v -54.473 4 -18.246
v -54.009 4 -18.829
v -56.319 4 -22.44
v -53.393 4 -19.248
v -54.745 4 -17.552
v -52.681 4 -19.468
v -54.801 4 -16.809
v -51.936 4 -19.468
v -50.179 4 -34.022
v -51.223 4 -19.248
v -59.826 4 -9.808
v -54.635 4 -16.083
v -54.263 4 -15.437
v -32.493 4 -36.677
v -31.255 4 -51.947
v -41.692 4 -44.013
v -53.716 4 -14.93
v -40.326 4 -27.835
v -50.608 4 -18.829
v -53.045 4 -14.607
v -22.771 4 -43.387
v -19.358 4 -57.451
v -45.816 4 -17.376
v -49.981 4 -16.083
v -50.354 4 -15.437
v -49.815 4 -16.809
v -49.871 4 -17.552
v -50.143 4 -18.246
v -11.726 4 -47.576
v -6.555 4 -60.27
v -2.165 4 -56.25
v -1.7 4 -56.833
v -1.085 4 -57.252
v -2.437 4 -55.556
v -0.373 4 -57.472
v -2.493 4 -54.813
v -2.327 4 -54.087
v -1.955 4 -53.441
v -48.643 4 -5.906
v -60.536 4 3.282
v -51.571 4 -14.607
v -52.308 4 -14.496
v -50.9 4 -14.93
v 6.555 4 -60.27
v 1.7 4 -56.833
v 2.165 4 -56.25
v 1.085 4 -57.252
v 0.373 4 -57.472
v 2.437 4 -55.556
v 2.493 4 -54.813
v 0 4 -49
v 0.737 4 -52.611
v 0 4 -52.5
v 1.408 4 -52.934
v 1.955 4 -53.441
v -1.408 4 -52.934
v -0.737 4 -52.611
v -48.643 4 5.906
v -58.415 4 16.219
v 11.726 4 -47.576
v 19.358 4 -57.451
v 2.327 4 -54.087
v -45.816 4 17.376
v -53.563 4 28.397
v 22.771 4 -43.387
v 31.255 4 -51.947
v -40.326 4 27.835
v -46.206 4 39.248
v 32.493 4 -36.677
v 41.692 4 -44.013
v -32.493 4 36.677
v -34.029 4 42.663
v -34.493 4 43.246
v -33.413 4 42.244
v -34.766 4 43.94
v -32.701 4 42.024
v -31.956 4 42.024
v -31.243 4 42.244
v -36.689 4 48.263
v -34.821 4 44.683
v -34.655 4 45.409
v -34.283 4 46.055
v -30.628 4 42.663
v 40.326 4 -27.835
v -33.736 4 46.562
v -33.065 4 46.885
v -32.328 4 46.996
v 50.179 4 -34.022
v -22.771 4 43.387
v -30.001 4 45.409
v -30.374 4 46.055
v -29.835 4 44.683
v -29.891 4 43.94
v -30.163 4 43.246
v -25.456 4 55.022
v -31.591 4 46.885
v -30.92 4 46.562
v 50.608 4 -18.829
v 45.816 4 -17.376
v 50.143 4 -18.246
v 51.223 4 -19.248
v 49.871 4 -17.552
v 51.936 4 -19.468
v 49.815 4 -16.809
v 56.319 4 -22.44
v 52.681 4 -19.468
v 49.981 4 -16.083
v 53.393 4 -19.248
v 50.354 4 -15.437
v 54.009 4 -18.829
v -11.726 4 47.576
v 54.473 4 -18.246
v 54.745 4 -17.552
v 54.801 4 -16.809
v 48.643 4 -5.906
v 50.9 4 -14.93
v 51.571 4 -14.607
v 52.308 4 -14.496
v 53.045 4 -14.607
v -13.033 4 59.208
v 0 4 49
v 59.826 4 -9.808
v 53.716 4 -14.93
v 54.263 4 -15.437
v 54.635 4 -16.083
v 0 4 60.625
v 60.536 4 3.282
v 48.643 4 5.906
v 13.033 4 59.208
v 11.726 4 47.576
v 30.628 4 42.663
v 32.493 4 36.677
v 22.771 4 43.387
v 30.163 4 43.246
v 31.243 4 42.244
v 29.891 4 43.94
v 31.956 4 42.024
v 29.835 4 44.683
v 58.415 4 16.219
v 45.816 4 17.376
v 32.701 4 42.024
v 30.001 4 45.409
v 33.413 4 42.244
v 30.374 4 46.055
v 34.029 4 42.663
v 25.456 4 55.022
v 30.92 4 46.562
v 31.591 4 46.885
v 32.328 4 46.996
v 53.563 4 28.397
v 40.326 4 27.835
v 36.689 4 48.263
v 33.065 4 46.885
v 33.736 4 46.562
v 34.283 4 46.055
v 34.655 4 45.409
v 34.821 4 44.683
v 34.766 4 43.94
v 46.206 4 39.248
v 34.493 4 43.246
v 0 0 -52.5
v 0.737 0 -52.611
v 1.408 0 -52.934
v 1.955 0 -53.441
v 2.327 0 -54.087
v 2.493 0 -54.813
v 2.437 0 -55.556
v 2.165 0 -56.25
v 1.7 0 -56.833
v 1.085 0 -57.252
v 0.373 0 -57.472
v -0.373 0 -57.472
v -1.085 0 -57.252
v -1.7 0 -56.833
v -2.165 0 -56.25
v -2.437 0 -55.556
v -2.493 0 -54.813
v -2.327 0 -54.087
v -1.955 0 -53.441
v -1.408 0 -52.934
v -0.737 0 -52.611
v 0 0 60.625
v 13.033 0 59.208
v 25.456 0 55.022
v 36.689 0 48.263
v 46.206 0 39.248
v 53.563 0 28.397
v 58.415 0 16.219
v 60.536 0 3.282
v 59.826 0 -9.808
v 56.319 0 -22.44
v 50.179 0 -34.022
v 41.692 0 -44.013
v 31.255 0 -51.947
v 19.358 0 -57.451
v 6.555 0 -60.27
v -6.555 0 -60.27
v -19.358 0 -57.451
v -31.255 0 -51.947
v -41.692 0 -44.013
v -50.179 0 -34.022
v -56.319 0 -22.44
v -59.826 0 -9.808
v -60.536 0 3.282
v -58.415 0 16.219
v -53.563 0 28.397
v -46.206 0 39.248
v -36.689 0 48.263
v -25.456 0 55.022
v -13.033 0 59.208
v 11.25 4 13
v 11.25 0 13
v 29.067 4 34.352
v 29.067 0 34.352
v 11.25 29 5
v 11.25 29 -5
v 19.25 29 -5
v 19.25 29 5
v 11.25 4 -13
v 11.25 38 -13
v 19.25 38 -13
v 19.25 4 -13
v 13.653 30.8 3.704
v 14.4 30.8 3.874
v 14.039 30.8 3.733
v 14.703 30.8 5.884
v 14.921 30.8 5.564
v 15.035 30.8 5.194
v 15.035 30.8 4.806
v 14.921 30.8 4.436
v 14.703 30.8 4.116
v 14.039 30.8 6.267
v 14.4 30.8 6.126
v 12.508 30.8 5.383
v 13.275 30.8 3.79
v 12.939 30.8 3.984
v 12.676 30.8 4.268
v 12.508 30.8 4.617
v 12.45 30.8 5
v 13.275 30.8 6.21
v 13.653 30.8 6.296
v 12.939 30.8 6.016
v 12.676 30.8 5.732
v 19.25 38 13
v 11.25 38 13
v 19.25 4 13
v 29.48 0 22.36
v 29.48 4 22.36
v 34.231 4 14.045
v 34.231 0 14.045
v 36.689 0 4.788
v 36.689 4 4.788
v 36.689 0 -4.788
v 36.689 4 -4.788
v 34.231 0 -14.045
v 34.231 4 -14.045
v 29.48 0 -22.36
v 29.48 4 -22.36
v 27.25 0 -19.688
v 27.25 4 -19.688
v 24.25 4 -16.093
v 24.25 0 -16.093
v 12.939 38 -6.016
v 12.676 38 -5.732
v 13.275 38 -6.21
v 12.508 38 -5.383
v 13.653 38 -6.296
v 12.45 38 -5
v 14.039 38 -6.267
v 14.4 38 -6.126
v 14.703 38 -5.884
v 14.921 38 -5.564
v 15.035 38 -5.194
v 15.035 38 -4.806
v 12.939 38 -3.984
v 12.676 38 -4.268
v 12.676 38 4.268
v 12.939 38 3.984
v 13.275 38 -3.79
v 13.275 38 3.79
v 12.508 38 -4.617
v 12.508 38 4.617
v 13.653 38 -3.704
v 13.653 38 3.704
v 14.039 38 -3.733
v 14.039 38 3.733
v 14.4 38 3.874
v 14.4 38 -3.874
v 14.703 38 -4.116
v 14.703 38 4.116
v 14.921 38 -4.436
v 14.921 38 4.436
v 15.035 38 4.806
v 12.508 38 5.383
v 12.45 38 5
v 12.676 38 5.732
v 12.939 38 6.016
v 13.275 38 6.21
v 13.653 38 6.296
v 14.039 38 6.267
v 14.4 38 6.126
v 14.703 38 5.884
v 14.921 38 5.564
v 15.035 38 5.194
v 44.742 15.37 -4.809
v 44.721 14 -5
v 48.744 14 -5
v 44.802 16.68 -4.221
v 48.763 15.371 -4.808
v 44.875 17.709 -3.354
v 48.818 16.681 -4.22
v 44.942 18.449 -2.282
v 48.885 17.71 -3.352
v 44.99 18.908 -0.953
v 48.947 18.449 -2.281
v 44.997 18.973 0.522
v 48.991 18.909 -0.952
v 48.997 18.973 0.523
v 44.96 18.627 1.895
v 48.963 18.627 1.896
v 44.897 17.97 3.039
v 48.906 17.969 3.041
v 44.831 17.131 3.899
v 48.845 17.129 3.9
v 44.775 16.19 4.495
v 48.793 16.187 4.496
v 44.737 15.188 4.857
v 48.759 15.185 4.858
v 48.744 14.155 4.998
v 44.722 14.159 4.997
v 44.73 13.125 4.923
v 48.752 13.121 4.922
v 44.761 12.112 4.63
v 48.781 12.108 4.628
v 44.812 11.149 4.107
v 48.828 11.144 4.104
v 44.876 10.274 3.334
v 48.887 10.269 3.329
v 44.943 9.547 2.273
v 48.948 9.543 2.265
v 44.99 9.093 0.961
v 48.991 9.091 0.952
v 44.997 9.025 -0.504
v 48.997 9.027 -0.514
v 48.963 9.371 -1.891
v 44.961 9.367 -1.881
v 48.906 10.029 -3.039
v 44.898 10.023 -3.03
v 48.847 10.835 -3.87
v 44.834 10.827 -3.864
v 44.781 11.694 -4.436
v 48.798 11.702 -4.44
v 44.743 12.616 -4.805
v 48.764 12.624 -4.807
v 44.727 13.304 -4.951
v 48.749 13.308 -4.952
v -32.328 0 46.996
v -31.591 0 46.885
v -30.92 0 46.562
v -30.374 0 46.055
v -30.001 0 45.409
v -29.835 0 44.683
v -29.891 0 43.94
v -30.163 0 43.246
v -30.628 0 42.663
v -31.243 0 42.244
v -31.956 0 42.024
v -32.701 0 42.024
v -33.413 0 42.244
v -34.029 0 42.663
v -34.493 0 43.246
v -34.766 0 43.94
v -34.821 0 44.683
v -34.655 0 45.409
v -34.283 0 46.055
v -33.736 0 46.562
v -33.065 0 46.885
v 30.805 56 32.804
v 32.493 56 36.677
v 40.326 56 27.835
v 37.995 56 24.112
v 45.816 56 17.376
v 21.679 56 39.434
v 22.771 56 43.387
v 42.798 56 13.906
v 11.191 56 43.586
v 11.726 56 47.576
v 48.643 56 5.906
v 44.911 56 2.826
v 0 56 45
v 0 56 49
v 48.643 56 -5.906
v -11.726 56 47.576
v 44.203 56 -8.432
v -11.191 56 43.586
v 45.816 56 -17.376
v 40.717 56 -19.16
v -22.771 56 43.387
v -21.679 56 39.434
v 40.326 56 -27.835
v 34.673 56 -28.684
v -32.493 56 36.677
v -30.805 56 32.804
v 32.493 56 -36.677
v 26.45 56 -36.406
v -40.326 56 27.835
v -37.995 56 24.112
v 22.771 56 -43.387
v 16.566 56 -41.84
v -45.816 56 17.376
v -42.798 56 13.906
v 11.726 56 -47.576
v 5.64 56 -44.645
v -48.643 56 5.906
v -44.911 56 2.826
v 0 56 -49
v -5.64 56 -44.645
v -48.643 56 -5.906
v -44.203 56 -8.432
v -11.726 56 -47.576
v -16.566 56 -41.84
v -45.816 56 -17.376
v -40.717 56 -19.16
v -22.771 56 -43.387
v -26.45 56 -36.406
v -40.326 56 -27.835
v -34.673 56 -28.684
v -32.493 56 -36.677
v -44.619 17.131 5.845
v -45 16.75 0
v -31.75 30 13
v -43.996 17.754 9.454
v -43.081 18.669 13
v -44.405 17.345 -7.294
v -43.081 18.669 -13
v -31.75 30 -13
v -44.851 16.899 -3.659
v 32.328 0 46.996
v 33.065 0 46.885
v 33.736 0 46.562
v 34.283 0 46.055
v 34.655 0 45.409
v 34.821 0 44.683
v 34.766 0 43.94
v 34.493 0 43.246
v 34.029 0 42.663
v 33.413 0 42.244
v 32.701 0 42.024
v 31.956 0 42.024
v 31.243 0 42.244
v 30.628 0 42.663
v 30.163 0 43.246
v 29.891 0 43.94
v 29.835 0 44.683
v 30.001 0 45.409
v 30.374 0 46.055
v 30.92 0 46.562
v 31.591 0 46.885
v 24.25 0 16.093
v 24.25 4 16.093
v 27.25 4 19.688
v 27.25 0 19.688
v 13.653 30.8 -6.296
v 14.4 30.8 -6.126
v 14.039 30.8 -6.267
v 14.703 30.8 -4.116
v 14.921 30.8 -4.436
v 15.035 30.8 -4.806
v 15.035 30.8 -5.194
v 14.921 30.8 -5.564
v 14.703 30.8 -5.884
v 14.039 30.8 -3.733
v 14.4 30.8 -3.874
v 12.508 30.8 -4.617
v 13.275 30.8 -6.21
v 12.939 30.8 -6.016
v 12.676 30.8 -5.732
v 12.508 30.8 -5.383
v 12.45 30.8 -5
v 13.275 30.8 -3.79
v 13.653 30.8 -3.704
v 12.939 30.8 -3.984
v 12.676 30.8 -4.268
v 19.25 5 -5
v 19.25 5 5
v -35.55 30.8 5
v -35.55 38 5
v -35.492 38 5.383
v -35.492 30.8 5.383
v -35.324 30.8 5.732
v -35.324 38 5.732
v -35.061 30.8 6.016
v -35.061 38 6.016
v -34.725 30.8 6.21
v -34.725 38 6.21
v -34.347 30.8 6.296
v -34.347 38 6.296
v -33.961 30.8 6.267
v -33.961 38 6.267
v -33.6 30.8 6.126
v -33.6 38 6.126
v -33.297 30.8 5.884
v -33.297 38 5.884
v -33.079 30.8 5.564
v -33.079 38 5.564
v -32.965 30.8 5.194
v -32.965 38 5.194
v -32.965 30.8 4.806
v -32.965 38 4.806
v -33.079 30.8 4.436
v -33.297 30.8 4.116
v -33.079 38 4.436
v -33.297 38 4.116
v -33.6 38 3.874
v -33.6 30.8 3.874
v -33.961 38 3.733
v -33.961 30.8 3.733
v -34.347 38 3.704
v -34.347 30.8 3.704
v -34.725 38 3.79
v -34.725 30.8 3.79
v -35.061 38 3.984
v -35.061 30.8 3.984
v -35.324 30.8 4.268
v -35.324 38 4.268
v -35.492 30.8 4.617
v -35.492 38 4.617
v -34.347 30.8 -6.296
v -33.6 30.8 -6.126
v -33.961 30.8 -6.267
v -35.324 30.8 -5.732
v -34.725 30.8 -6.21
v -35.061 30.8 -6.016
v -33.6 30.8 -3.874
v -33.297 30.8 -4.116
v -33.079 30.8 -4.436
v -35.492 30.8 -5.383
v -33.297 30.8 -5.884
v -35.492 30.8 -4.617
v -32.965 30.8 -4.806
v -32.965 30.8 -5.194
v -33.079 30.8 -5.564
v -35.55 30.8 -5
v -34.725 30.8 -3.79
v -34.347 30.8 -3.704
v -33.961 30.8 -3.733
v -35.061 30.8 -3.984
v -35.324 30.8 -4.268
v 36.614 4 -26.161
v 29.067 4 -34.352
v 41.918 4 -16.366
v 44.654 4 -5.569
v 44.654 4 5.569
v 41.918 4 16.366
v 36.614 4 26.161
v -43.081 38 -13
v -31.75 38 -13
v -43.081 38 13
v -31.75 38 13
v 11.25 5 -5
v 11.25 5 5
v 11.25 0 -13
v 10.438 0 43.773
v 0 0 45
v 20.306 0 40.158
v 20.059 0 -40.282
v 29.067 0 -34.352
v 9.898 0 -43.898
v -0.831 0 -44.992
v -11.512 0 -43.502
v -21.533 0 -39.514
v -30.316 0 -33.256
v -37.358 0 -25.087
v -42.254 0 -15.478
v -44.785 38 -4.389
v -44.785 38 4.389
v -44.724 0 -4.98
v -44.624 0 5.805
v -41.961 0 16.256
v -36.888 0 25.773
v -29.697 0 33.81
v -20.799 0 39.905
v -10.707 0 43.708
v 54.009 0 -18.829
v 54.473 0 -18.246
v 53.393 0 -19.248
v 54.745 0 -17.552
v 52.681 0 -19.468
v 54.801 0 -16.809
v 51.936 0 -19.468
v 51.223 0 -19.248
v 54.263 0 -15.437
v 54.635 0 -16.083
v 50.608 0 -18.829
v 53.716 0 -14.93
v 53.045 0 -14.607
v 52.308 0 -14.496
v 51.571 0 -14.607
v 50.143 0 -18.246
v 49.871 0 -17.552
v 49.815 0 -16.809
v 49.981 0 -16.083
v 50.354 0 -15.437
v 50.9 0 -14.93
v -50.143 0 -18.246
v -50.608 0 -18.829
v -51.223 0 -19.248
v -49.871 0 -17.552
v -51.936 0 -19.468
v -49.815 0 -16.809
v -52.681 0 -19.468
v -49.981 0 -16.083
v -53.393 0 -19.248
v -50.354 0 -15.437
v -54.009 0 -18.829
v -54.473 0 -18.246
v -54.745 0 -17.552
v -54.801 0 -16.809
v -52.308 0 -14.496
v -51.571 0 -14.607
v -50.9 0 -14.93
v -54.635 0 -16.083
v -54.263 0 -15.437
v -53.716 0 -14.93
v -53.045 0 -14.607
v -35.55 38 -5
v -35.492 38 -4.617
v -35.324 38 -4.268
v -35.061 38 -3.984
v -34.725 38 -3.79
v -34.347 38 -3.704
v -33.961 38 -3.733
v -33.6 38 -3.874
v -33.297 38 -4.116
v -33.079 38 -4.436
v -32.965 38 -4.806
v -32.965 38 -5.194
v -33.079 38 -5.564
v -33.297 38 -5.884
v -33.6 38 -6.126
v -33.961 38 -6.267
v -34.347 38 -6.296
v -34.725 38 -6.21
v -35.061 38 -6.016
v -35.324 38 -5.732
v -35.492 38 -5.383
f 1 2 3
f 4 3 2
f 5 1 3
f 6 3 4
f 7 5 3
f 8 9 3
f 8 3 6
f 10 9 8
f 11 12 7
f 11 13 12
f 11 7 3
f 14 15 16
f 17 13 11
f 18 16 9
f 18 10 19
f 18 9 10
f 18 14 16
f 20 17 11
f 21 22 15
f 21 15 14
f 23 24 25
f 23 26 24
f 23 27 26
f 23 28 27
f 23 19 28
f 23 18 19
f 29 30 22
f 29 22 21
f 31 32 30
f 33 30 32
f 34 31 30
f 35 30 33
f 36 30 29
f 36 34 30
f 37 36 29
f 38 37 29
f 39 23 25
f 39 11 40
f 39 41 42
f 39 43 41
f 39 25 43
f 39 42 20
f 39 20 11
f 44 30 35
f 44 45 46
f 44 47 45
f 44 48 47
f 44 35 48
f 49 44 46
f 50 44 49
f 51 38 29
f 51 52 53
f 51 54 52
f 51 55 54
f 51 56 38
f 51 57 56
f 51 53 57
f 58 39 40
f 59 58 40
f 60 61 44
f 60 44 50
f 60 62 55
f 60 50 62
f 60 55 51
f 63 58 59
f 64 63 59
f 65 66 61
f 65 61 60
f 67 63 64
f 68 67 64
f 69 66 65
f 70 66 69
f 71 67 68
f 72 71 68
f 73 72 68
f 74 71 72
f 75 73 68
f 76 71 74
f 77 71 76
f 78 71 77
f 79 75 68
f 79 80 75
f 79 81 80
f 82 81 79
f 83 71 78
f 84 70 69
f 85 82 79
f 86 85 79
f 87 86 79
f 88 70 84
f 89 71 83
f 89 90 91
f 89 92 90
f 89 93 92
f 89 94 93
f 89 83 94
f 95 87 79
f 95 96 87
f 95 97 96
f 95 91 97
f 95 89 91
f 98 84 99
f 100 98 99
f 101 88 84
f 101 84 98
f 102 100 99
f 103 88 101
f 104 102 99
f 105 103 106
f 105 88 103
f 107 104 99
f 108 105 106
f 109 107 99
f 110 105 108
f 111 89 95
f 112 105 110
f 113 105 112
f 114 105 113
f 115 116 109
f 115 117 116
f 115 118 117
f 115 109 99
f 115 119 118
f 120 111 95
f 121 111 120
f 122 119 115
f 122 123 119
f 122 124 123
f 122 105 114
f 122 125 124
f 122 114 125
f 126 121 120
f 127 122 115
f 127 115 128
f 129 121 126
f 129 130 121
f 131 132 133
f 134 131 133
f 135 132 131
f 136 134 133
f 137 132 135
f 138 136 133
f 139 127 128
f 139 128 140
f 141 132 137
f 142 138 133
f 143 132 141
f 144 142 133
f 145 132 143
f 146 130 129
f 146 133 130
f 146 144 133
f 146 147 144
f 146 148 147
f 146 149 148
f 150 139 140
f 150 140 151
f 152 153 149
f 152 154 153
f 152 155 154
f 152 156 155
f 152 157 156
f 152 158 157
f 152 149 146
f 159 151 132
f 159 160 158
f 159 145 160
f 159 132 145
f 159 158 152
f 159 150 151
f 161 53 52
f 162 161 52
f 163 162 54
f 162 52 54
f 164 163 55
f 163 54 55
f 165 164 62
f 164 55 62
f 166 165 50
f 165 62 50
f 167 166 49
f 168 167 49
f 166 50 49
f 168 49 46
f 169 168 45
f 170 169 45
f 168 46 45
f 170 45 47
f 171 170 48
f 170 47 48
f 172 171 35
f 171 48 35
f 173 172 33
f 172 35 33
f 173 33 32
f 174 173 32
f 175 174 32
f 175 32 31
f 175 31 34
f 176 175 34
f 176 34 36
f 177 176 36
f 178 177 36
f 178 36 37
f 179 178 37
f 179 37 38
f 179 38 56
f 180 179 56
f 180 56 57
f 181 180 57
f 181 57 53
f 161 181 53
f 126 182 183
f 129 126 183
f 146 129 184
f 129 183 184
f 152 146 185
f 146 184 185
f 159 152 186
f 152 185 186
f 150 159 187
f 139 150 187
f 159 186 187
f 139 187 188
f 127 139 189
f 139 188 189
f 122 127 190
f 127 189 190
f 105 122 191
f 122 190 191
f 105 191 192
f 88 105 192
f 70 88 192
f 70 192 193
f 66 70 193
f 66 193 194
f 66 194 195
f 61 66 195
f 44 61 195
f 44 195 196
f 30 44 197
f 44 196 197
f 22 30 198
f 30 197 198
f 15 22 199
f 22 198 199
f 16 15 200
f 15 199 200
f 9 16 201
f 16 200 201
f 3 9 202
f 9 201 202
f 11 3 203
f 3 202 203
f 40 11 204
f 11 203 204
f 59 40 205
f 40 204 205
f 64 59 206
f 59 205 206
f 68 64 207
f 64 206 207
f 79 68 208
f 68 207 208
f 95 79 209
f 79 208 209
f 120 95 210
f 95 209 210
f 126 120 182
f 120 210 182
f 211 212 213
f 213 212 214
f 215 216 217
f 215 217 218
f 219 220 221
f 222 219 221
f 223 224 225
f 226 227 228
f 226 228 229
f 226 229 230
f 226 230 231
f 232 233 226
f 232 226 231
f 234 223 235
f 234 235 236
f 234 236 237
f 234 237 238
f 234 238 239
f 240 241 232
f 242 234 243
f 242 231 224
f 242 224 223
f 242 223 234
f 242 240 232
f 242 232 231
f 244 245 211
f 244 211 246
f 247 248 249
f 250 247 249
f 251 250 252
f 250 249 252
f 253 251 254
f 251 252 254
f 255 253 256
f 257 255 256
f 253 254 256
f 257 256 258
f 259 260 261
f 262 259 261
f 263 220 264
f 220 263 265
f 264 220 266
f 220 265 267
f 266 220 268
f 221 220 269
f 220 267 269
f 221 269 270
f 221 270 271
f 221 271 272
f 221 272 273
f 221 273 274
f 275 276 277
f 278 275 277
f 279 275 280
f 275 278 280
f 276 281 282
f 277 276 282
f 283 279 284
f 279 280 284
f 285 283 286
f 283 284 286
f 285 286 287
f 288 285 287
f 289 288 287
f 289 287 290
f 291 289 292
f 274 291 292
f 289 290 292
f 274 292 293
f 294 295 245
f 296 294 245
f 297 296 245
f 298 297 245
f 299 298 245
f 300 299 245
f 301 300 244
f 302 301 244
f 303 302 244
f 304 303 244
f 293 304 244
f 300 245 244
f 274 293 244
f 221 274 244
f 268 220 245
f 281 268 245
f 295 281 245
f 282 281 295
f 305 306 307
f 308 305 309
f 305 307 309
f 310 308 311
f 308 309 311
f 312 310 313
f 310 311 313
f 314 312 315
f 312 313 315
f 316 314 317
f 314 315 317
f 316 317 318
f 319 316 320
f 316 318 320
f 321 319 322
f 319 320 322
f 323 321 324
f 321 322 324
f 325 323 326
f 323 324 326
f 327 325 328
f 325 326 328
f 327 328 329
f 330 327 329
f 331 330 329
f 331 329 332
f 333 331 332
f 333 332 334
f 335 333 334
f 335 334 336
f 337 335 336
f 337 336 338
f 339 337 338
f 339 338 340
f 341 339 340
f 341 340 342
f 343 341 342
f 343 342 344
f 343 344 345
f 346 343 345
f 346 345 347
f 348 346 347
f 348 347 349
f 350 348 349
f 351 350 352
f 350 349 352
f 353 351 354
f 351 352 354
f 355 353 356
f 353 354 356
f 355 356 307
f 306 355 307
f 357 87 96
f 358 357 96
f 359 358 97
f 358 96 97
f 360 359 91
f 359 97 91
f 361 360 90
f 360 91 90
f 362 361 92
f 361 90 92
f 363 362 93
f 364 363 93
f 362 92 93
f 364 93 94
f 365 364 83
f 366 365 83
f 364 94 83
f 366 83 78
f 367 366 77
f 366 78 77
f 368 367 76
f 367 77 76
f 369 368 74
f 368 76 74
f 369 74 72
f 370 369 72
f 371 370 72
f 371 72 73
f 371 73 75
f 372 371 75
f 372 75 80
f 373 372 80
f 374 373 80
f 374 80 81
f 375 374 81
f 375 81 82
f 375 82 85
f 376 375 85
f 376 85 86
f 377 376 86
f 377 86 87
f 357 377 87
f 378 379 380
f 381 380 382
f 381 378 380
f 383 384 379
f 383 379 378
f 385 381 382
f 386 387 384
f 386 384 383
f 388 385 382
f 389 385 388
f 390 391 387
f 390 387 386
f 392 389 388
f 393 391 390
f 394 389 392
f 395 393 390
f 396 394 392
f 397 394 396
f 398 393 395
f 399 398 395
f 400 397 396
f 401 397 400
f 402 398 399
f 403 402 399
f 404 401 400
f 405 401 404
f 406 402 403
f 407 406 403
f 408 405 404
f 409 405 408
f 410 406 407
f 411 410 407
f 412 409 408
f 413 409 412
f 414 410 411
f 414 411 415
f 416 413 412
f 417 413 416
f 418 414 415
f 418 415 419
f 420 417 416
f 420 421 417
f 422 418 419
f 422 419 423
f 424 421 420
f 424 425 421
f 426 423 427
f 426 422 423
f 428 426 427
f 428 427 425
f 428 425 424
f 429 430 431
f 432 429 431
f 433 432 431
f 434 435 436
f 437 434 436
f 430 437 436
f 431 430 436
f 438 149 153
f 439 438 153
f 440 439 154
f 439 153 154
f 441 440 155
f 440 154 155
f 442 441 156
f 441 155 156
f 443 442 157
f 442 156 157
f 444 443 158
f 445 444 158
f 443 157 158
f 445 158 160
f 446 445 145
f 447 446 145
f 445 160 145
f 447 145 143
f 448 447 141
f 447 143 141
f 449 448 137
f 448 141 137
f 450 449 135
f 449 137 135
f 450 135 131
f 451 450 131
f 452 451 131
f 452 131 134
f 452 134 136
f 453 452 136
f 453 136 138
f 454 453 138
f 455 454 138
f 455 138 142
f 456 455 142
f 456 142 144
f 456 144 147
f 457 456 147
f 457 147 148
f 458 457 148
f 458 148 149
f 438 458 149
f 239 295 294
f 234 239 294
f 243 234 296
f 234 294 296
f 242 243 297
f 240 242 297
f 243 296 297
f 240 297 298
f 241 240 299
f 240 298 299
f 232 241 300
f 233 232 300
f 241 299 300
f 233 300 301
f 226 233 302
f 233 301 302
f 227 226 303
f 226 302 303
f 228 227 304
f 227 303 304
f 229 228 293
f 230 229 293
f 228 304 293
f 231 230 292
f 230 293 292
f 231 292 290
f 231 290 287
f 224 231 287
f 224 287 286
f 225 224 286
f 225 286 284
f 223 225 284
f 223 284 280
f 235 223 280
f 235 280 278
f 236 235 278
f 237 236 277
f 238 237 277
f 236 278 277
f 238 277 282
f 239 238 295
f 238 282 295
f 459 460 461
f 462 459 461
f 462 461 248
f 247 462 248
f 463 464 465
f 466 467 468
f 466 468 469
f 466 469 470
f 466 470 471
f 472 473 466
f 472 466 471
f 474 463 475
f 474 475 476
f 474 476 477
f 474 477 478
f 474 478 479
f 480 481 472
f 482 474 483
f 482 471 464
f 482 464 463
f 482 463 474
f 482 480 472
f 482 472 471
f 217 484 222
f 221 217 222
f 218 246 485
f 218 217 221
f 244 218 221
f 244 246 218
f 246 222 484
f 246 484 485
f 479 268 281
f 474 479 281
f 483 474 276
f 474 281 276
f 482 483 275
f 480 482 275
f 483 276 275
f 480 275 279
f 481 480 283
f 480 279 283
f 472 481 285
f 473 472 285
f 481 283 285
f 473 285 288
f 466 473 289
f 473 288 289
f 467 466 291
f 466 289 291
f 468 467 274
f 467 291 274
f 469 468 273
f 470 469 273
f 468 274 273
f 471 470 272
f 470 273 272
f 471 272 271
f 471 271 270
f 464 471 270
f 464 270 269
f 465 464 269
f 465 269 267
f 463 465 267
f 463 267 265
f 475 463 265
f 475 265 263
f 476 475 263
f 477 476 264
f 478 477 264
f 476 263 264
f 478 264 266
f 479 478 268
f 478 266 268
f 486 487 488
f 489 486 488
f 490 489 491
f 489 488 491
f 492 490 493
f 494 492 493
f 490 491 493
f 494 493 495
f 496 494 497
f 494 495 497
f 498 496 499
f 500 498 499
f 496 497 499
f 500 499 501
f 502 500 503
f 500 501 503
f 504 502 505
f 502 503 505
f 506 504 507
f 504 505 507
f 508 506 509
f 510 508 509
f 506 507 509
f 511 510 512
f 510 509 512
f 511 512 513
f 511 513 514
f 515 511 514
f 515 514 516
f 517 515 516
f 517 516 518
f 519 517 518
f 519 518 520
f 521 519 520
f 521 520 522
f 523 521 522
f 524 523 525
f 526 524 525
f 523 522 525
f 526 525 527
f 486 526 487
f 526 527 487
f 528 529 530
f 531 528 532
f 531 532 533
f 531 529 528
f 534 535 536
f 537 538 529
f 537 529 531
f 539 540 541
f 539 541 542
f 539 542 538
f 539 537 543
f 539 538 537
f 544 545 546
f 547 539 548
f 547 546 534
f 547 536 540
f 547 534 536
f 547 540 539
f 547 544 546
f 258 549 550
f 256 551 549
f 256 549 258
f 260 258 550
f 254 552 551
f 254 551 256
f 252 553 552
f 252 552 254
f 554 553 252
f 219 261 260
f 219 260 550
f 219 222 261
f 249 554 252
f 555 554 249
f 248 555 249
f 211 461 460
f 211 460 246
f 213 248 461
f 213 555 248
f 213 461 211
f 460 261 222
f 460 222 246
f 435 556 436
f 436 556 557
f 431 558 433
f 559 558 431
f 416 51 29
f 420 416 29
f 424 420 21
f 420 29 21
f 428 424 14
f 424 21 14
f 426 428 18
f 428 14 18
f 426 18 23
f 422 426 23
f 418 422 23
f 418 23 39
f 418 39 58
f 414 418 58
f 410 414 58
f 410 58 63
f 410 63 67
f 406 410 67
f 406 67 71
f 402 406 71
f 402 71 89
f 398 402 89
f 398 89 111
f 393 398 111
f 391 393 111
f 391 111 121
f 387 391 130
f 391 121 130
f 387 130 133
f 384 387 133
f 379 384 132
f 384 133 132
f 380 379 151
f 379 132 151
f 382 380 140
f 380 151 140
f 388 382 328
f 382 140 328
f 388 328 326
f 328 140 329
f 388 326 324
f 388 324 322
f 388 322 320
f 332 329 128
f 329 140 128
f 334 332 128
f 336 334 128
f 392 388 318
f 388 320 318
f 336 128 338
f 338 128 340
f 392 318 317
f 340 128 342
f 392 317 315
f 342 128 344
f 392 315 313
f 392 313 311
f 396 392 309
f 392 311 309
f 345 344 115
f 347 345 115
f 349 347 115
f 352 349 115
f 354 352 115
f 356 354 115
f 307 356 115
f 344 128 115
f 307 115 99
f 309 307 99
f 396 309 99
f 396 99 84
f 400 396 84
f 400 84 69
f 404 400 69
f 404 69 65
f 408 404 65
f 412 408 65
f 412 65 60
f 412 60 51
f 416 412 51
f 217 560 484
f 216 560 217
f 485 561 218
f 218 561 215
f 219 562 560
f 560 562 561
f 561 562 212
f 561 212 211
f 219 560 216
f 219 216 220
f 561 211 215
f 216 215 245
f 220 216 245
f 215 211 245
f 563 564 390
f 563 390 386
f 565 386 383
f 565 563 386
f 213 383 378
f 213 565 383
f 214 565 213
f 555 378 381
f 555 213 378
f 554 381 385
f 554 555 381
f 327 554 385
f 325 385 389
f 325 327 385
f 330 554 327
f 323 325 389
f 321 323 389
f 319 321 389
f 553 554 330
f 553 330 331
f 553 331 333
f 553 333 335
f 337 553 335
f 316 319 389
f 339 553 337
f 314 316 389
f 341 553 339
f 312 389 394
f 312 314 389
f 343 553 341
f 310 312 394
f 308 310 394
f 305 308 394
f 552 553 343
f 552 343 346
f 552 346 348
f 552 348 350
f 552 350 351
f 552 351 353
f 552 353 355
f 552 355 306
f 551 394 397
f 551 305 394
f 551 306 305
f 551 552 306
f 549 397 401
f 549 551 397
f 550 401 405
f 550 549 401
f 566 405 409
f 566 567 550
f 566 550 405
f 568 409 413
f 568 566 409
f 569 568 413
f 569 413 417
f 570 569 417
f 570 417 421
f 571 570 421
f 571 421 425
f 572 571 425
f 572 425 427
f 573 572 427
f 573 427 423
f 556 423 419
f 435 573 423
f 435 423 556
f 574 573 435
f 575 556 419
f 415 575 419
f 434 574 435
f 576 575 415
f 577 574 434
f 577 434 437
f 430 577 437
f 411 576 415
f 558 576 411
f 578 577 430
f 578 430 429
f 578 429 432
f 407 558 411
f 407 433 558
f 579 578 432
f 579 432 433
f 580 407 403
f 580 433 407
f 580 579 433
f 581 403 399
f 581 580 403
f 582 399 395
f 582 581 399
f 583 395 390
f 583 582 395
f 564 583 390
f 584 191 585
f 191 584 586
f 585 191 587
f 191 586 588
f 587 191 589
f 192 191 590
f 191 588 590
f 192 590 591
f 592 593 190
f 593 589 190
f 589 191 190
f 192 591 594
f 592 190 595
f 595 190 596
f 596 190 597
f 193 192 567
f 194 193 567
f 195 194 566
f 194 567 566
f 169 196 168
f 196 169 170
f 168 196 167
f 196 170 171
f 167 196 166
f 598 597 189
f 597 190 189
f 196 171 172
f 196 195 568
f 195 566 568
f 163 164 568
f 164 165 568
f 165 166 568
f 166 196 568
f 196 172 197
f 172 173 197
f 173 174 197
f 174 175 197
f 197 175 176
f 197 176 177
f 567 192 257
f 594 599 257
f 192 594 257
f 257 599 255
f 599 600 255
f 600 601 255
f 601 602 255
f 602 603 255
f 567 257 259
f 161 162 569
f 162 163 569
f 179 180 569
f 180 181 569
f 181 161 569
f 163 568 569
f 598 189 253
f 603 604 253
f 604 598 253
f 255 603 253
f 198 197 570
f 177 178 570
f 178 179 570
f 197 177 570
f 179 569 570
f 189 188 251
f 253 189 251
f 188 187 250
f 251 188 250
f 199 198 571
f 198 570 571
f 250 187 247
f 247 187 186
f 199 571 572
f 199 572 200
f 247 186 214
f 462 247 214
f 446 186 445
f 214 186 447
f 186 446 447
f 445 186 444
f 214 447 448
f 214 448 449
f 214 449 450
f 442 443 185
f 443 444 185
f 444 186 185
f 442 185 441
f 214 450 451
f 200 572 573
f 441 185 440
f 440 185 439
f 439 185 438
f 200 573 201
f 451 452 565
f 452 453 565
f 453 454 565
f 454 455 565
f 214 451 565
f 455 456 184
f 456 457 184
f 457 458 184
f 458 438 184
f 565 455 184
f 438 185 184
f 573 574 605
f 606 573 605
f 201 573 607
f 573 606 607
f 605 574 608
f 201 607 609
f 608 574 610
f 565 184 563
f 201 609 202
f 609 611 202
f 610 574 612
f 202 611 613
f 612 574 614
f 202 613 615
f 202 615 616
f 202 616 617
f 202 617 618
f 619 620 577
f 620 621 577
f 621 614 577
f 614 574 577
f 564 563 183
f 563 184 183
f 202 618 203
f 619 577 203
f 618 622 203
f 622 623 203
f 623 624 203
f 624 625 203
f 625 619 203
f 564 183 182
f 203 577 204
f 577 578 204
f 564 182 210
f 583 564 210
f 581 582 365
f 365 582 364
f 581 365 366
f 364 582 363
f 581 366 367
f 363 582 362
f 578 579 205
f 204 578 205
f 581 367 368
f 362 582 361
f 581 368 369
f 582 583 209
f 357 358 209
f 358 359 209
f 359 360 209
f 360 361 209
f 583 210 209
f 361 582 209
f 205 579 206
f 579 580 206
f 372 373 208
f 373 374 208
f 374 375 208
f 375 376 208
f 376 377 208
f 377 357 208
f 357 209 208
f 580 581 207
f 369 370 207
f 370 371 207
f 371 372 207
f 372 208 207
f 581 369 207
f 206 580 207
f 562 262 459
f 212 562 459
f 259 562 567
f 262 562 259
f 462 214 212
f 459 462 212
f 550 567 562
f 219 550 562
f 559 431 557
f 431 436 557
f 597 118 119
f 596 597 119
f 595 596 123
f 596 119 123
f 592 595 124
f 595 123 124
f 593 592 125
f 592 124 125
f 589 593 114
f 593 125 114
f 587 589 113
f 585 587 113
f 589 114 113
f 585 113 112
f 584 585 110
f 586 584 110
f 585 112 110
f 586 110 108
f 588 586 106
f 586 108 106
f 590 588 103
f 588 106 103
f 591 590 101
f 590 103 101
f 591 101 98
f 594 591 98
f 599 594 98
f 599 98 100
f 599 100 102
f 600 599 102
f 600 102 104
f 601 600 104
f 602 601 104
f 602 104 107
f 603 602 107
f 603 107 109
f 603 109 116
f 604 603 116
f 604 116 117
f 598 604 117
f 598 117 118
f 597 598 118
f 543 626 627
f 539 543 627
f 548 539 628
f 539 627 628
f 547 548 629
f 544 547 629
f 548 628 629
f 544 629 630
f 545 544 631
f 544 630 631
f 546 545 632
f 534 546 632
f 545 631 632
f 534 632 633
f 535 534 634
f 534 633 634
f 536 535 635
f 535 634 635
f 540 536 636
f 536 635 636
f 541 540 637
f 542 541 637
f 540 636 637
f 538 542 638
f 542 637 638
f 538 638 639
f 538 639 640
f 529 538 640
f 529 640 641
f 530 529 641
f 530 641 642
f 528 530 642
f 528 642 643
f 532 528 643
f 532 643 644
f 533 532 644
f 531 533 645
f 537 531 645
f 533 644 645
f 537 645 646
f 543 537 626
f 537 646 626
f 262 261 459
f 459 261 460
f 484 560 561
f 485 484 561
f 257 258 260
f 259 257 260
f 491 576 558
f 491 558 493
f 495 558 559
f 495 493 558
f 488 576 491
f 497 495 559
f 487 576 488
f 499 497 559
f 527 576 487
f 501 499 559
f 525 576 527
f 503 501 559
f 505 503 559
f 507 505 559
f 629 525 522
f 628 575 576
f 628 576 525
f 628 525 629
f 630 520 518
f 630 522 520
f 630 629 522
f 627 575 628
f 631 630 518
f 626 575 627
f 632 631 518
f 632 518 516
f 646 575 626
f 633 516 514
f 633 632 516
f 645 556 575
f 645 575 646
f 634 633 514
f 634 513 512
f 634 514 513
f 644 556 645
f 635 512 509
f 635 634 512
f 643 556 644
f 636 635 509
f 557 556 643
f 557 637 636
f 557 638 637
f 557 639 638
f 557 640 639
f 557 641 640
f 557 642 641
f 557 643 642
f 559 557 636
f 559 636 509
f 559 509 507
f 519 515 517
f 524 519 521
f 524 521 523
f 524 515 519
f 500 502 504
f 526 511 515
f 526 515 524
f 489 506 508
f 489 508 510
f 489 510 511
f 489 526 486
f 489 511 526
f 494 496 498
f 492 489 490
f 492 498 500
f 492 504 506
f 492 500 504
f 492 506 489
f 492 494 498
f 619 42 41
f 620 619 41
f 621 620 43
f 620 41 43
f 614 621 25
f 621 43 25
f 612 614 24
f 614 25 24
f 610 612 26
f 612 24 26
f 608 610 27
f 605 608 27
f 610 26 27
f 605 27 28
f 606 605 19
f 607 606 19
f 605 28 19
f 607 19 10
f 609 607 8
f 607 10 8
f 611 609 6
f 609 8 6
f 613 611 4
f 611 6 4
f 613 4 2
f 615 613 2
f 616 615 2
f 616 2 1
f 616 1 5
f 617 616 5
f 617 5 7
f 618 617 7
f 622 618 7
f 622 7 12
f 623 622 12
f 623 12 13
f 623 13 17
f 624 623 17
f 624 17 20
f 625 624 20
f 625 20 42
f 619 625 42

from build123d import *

# Parameters (mm, degrees)
SKETCH1_R               = 60.625
SKETCH1_R_2             = 45
BOSS_EXTRUDE1_DEPTH     = 4
SKETCH2_R               = 49
SKETCH2_R_2             = 45
BOSS_EXTRUDE2_DEPTH     = 52
SKETCH4_W               = 13.25
SKETCH4_H               = 8
SKETCH4_W_2             = 8
SKETCH4_H_2             = 38
BOSS_EXTRUDE4_DEPTH     = 13
BOSS_EXTRUDE5_DEPTH     = 4
SKETCH7_R               = 1.3
CUT_EXTRUDE4_DEPTH      = 7.2
SKETCH9_W               = 10
SKETCH9_H               = 24
CUT_EXTRUDE7_DEPTH      = 8
CUT_EXTRUDE8_REACH      = 139.219
CUT_EXTRUDE8_END_RADIUS = 45
SKETCH11_R              = 5
CUT_EXTRUDE9_DEPTH      = 101.273532203
SKETCH15_R              = 2.5
CUT_EXTRUDE10_DEPTH     = 10


with BuildPart() as part:
    # Sketch1 → Boss-Extrude1 (new body)
    with BuildSketch(Plane(origin=(0, 0, 0), x_dir=(1, 0, 0), z_dir=(0, 1, 0))):
        with Locations(Location((0, 0, 0), (0, 0, 270))):
            Circle(SKETCH1_R)
        with Locations(Location((0, 0, 0), (0, 0, 270))):
            Circle(SKETCH1_R_2, mode=Mode.SUBTRACT)
    extrude(amount=BOSS_EXTRUDE1_DEPTH)

    # Sketch2 → Boss-Extrude2 (add)
    with BuildSketch(Plane(origin=(0, 4, 0), x_dir=(1, 0, 0), z_dir=(0, 1, 0))):
        with Locations(Location((0, 0, 0), (0, 0, 90))):
            Circle(SKETCH2_R)
        with Locations(Location((0, 0, 0), (0, 0, 270))):
            Circle(SKETCH2_R_2, mode=Mode.SUBTRACT)
    extrude(amount=BOSS_EXTRUDE2_DEPTH)

    # Sketch4 → Boss-Extrude4 (add, symmetric)
    with BuildSketch(Plane.XY):
        with Locations((-38.375, 34)):
            Rectangle(SKETCH4_W, SKETCH4_H)
        Polygon((-31.75, 30), (-45, 30), (-45, 16.75), align=None)
        with Locations((15.25, 19)):
            Rectangle(SKETCH4_W_2, SKETCH4_H_2)
    extrude(amount=BOSS_EXTRUDE4_DEPTH, both=True)


with BuildPart() as boss_extrude4_piece_1:
    # of the separate pieces the step leaves, piece 1, a body of its own (boss_extrude4_pieces)
    add(part.part.solids().sort_by_distance((0, 0, 60.625))[0])



with BuildPart() as boss_extrude4_piece_2:
    # of the separate pieces the step leaves, piece 2, a body of its own (boss_extrude4_pieces)
    add(part.part.solids().sort_by_distance((11.25, 38, -13))[0])


with BuildPart() as boss_extrude4_piece_1_1:
    add(boss_extrude4_piece_1.part)

    add(boss_extrude4_piece_2.part)  # Boss-Extrude5 merges Boss-Extrude4 piece 2
    # Sketch5 → Boss-Extrude5 (add)
    with BuildSketch(Plane.XZ):
        with BuildLine():
            Line((11.25, 13), (29.067400866, 34.352382842))
            ThreePointArc((29.067400866, 34.352382842), (45, 0), (29.067400866, -34.352382842))
            Line((29.067400866, -34.352382842), (11.25, -13))
            Line((11.25, -13), (11.25, 13))
        make_face()
    extrude(amount=-BOSS_EXTRUDE5_DEPTH)

    # Sketch7 → Cut-Extrude4 (cut)
    with BuildSketch(Plane(origin=(0, 38, 0), x_dir=(1, 0, 0), z_dir=(0, 1, 0))):
        with Locations(Location((-34.25, 5, 0), (0, 0, 180))):
            Circle(SKETCH7_R)
        with Locations(Location((-34.25, -5, 0), (0, 0, 180))):
            Circle(SKETCH7_R)
        with Locations(Location((13.75, 5, 0), (0, 0, 180))):
            Circle(SKETCH7_R)
        with Locations(Location((13.75, -5, 0), (0, 0, 180))):
            Circle(SKETCH7_R)
    extrude(amount=-CUT_EXTRUDE4_DEPTH, mode=Mode.SUBTRACT)

    # Sketch9 → Cut-Extrude7 (cut)
    with BuildSketch(Plane.ZY.offset(-11.25)):
        with Locations((0, 17)):
            Rectangle(SKETCH9_W, SKETCH9_H)
    extrude(amount=-CUT_EXTRUDE7_DEPTH, mode=Mode.SUBTRACT)

    # Cut-Extrude8: up to this cylinder (the profile starts outside it)
    cut_extrude8_end = Plane(origin=(0, 14, 0), z_dir=(0, -1, 0)) * Cylinder(CUT_EXTRUDE8_END_RADIUS, 369.438, mode=Mode.PRIVATE)
    # Sketch11 → Cut-Extrude8 (cut, up to the surface)
    with BuildSketch(Plane(origin=(49, 0, 0), x_dir=(0, 0, -1), z_dir=(1, 0, 0)), mode=Mode.PRIVATE) as cut_extrude8_sk1:
        with Locations((0, 14)):
            Circle(SKETCH11_R)
    cut_extrude8_tool1 = extrude(cut_extrude8_sk1.sketch, amount=-CUT_EXTRUDE8_REACH, mode=Mode.PRIVATE) - cut_extrude8_end
    add(cut_extrude8_tool1.solids().sort_by_distance((49, 14, 0))[0], mode=Mode.SUBTRACT)

    # Sketch12 → Cut-Extrude9 (cut, through all)
    with BuildSketch(Plane(origin=(0, 4, 0), x_dir=(1, 0, 0), z_dir=(0, 1, 0))):
        with BuildLine():
            Line((29.479537487, 22.359715328), (27.25, 19.687836398))
            Line((27.25, 19.687836398), (27.25, -19.687836398))
            Line((27.25, -19.687836398), (29.479537487, -22.359715328))
            ThreePointArc((29.479537487, -22.359715328), (37, 0), (29.479537487, 22.359715328))
        make_face()
        Polygon((27.25, -19.687836398), (27.25, 19.687836398), (24.25, 16.092634774), (24.25, -16.092634774), align=None)
    extrude(amount=-CUT_EXTRUDE9_DEPTH, mode=Mode.SUBTRACT)

    # Sketch15 → Cut-Extrude10 (cut)
    with BuildSketch(Plane(origin=(0, 4, 0), x_dir=(1, 0, 0), z_dir=(0, 1, 0))):
        with Locations(Location((0, 55, 0), (0, 0, 270))):
            Circle(SKETCH15_R)
        with Locations(Location((52.308108396, 16.995934691, 0), (0, 0, 270))):
            Circle(SKETCH15_R)
        with Locations(Location((32.328188876, -44.495934691, 0), (0, 0, 270))):
            Circle(SKETCH15_R)
        with Locations(Location((-32.328188876, -44.495934691, 0), (0, 0, 270))):
            Circle(SKETCH15_R)
        with Locations(Location((-52.308108396, 16.995934691, 0), (0, 0, 270))):
            Circle(SKETCH15_R)
    extrude(amount=-CUT_EXTRUDE10_DEPTH, mode=Mode.SUBTRACT)


solid = boss_extrude4_piece_1_1.part
